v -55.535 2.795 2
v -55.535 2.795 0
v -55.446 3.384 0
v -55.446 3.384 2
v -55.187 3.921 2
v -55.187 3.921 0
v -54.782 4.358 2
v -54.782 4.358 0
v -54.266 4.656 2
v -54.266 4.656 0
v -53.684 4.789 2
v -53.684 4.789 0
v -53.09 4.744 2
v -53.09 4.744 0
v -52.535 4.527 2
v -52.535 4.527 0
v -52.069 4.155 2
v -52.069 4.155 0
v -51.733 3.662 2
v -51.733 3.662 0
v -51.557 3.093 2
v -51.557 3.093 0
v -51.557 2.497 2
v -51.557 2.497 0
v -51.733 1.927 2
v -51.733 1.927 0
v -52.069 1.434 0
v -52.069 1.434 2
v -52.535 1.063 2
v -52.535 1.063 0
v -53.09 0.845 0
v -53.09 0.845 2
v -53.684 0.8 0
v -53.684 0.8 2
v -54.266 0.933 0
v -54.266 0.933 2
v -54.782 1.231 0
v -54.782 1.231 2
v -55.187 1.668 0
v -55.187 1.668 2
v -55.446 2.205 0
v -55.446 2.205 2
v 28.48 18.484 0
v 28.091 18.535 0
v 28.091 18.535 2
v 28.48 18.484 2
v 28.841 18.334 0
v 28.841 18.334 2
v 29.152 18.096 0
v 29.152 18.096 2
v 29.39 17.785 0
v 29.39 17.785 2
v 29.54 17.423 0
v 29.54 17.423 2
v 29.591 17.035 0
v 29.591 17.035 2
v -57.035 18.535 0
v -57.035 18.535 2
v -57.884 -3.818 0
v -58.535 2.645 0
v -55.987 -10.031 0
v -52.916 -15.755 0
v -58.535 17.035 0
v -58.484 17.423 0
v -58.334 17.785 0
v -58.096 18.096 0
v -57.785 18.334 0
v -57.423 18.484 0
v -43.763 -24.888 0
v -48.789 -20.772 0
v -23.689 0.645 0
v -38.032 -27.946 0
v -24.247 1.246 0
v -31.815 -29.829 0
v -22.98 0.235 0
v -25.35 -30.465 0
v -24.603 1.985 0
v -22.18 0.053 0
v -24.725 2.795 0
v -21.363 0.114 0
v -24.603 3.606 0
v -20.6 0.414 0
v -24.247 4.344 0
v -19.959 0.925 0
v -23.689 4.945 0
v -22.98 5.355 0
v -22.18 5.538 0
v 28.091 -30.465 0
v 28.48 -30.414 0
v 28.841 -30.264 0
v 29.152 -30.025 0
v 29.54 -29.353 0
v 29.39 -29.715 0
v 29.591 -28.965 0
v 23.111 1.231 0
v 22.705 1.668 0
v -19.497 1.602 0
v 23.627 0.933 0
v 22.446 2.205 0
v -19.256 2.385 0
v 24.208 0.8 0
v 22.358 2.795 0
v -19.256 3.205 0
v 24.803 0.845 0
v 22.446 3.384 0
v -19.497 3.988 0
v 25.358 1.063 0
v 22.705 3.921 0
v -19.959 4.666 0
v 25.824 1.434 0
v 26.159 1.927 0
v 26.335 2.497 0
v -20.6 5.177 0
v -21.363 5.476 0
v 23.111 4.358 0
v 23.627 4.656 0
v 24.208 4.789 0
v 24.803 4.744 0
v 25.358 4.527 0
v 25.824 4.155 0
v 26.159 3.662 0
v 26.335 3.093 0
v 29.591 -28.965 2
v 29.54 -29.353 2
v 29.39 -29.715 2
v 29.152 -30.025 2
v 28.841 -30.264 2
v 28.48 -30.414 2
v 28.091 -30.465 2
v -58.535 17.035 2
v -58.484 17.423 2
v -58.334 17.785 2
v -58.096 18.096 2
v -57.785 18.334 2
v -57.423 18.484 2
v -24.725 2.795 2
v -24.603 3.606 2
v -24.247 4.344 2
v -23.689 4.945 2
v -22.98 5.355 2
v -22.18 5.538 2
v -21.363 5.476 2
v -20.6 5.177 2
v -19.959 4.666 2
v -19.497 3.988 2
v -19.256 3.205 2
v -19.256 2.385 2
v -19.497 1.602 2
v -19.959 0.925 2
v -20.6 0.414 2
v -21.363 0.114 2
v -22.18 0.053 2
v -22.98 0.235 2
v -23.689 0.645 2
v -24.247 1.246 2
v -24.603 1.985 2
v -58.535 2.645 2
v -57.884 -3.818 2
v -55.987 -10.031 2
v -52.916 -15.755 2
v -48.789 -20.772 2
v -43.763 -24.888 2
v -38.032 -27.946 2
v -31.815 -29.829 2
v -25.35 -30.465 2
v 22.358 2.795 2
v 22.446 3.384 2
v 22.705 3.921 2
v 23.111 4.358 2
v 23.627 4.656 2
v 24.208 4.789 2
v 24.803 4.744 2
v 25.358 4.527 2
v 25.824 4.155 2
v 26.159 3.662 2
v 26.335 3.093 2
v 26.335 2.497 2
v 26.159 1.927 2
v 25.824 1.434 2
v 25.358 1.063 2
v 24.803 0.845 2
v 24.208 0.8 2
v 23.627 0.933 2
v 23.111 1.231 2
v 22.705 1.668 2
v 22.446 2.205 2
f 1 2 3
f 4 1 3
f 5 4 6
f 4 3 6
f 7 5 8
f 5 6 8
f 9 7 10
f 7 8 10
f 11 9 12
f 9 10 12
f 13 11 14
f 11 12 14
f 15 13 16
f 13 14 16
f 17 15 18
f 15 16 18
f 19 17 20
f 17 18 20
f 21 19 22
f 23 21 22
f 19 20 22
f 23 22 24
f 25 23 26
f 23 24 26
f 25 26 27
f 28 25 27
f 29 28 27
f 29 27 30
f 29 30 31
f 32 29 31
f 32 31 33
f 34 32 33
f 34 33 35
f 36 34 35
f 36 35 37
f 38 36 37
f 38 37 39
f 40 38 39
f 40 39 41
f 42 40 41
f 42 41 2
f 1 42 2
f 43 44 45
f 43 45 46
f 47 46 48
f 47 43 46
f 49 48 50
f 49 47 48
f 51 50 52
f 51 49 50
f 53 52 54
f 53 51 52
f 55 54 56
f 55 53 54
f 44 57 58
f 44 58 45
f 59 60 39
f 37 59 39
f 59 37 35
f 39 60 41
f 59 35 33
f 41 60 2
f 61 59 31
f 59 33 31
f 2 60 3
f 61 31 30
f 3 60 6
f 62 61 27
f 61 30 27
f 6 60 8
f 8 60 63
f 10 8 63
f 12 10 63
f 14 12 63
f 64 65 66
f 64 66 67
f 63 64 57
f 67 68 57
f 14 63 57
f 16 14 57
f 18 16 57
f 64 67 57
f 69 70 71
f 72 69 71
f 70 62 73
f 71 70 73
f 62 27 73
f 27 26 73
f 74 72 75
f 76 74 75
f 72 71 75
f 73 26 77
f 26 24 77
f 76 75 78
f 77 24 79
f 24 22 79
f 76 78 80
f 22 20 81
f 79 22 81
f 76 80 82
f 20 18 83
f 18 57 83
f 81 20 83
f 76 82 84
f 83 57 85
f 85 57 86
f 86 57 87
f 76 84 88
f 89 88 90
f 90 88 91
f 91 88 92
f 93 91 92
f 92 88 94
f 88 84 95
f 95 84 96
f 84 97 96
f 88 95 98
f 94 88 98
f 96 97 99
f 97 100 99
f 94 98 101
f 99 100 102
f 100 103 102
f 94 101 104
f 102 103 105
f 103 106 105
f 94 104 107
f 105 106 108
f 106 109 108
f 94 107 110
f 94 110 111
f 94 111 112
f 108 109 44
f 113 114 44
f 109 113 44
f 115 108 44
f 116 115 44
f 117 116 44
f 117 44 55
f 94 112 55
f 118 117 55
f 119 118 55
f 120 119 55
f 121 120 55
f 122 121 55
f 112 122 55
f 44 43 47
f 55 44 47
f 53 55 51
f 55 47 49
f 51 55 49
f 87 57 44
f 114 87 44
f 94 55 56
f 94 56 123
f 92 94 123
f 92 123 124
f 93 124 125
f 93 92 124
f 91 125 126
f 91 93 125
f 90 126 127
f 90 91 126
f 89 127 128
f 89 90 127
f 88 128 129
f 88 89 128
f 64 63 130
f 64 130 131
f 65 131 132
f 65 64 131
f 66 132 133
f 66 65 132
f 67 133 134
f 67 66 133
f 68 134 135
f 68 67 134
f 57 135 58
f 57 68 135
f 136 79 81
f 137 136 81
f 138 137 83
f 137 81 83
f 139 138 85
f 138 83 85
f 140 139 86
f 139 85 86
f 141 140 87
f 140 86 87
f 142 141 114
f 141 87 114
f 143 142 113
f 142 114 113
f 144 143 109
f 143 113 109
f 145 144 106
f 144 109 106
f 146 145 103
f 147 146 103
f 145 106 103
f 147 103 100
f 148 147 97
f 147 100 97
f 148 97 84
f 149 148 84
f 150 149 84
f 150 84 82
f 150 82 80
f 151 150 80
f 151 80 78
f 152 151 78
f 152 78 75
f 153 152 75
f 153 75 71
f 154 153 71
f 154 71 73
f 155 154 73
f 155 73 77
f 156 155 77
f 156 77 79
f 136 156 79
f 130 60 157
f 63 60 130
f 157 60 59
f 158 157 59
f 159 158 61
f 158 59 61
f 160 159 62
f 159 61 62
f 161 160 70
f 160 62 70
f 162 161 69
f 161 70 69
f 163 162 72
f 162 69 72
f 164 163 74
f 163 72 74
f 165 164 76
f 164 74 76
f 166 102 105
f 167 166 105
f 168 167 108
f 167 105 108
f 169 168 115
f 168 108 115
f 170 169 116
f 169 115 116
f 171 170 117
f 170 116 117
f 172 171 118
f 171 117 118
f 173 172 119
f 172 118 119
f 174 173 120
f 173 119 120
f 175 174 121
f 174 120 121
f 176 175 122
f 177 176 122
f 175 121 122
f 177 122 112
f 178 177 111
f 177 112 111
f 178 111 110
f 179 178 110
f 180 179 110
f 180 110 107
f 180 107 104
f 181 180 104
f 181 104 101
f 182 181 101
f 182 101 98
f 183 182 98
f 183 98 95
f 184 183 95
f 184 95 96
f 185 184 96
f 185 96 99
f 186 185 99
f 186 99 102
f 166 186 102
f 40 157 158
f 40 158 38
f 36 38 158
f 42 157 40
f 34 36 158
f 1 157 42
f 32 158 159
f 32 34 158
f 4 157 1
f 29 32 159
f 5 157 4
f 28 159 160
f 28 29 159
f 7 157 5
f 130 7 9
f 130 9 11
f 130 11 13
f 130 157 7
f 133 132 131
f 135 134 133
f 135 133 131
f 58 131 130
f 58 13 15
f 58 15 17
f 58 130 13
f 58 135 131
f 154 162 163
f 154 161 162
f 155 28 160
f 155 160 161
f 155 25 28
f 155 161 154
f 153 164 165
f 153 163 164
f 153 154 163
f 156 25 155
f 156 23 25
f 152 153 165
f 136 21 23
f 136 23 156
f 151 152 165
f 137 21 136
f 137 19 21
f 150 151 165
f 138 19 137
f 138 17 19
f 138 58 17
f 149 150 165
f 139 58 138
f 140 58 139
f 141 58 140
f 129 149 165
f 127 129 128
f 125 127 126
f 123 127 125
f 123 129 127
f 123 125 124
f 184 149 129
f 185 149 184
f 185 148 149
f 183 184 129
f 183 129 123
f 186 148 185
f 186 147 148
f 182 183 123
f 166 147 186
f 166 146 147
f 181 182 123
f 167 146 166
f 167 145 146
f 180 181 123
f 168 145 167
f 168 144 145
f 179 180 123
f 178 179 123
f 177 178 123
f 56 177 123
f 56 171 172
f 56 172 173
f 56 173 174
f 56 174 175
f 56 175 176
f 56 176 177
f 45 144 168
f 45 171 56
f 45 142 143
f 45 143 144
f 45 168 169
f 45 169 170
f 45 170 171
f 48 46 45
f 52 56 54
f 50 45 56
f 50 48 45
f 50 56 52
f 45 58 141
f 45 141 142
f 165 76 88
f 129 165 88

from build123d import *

# Parameters (mm, degrees)
SKETCH1_W           = 117.069701218
SKETCH1_H           = 60.929458134
BOSS_EXTRUDE1_DEPTH = 2
SKETCH3_R           = 2
SKETCH3_R_2         = 2.75
CUT_EXTRUDE1_DEPTH  = 3


with BuildPart() as part:
    # Sketch1 → Boss-Extrude1 (new body)
    with BuildSketch(Plane.XY):
        Rectangle(SKETCH1_W, SKETCH1_H)
    extrude(amount=BOSS_EXTRUDE1_DEPTH)

    # Sketch3 → Cut-Extrude1 (cut, through all)
    with BuildSketch(Plane(origin=(0, 0, 0), x_dir=(-1, 0, 0), z_dir=(0, 0, -1))):
        with Locations((-24.357544508, 2.794584929)):
            Circle(SKETCH3_R)
        with Locations((53.534850609, 2.794584929)):
            Circle(SKETCH3_R)
        with Locations((21.97485305, 2.79526544)):
            Circle(SKETCH3_R_2)
        with BuildLine():
            Line((25.349937795, -30.464729067), (25.349937795, -36.756710317))
            Line((25.349937795, -36.756710317), (60.494221028, -36.756710317))
            Line((60.494221028, -36.756710317), (60.494221028, 2.79526544))
            Line((60.494221028, 2.79526544), (58.534850609, 2.79526544))
            ThreePointArc((58.534850609, 2.79526544), (48.841775064, -20.718537892), (25.349937795, -30.464729067))
        make_face()
        with BuildLine():
            Line((-29.591361368, 17.035270933), (-29.591361368, -28.964729067))
            ThreePointArc((-29.591361368, -28.964729067), (-29.15202154, -30.025389239), (-28.091361368, -30.464729067))
            Line((-28.091361368, -30.464729067), (-58.534850609, -30.464729067))
            Line((-58.534850609, -30.464729067), (-58.534850609, 30.464729067))
            Line((-58.534850609, 30.464729067), (58.534850609, 30.464729067))
            Line((58.534850609, 30.464729067), (58.534850609, 17.035270933))
            ThreePointArc((58.534850609, 17.035270933), (58.095510781, 18.095931105), (57.034850609, 18.535270933))
            Line((57.034850609, 18.535270933), (-28.091361368, 18.535270933))
            ThreePointArc((-28.091361368, 18.535270933), (-29.15202154, 18.095931105), (-29.591361368, 17.035270933))
        make_face()
    extrude(amount=-CUT_EXTRUDE1_DEPTH, mode=Mode.SUBTRACT)


solid = part.part
